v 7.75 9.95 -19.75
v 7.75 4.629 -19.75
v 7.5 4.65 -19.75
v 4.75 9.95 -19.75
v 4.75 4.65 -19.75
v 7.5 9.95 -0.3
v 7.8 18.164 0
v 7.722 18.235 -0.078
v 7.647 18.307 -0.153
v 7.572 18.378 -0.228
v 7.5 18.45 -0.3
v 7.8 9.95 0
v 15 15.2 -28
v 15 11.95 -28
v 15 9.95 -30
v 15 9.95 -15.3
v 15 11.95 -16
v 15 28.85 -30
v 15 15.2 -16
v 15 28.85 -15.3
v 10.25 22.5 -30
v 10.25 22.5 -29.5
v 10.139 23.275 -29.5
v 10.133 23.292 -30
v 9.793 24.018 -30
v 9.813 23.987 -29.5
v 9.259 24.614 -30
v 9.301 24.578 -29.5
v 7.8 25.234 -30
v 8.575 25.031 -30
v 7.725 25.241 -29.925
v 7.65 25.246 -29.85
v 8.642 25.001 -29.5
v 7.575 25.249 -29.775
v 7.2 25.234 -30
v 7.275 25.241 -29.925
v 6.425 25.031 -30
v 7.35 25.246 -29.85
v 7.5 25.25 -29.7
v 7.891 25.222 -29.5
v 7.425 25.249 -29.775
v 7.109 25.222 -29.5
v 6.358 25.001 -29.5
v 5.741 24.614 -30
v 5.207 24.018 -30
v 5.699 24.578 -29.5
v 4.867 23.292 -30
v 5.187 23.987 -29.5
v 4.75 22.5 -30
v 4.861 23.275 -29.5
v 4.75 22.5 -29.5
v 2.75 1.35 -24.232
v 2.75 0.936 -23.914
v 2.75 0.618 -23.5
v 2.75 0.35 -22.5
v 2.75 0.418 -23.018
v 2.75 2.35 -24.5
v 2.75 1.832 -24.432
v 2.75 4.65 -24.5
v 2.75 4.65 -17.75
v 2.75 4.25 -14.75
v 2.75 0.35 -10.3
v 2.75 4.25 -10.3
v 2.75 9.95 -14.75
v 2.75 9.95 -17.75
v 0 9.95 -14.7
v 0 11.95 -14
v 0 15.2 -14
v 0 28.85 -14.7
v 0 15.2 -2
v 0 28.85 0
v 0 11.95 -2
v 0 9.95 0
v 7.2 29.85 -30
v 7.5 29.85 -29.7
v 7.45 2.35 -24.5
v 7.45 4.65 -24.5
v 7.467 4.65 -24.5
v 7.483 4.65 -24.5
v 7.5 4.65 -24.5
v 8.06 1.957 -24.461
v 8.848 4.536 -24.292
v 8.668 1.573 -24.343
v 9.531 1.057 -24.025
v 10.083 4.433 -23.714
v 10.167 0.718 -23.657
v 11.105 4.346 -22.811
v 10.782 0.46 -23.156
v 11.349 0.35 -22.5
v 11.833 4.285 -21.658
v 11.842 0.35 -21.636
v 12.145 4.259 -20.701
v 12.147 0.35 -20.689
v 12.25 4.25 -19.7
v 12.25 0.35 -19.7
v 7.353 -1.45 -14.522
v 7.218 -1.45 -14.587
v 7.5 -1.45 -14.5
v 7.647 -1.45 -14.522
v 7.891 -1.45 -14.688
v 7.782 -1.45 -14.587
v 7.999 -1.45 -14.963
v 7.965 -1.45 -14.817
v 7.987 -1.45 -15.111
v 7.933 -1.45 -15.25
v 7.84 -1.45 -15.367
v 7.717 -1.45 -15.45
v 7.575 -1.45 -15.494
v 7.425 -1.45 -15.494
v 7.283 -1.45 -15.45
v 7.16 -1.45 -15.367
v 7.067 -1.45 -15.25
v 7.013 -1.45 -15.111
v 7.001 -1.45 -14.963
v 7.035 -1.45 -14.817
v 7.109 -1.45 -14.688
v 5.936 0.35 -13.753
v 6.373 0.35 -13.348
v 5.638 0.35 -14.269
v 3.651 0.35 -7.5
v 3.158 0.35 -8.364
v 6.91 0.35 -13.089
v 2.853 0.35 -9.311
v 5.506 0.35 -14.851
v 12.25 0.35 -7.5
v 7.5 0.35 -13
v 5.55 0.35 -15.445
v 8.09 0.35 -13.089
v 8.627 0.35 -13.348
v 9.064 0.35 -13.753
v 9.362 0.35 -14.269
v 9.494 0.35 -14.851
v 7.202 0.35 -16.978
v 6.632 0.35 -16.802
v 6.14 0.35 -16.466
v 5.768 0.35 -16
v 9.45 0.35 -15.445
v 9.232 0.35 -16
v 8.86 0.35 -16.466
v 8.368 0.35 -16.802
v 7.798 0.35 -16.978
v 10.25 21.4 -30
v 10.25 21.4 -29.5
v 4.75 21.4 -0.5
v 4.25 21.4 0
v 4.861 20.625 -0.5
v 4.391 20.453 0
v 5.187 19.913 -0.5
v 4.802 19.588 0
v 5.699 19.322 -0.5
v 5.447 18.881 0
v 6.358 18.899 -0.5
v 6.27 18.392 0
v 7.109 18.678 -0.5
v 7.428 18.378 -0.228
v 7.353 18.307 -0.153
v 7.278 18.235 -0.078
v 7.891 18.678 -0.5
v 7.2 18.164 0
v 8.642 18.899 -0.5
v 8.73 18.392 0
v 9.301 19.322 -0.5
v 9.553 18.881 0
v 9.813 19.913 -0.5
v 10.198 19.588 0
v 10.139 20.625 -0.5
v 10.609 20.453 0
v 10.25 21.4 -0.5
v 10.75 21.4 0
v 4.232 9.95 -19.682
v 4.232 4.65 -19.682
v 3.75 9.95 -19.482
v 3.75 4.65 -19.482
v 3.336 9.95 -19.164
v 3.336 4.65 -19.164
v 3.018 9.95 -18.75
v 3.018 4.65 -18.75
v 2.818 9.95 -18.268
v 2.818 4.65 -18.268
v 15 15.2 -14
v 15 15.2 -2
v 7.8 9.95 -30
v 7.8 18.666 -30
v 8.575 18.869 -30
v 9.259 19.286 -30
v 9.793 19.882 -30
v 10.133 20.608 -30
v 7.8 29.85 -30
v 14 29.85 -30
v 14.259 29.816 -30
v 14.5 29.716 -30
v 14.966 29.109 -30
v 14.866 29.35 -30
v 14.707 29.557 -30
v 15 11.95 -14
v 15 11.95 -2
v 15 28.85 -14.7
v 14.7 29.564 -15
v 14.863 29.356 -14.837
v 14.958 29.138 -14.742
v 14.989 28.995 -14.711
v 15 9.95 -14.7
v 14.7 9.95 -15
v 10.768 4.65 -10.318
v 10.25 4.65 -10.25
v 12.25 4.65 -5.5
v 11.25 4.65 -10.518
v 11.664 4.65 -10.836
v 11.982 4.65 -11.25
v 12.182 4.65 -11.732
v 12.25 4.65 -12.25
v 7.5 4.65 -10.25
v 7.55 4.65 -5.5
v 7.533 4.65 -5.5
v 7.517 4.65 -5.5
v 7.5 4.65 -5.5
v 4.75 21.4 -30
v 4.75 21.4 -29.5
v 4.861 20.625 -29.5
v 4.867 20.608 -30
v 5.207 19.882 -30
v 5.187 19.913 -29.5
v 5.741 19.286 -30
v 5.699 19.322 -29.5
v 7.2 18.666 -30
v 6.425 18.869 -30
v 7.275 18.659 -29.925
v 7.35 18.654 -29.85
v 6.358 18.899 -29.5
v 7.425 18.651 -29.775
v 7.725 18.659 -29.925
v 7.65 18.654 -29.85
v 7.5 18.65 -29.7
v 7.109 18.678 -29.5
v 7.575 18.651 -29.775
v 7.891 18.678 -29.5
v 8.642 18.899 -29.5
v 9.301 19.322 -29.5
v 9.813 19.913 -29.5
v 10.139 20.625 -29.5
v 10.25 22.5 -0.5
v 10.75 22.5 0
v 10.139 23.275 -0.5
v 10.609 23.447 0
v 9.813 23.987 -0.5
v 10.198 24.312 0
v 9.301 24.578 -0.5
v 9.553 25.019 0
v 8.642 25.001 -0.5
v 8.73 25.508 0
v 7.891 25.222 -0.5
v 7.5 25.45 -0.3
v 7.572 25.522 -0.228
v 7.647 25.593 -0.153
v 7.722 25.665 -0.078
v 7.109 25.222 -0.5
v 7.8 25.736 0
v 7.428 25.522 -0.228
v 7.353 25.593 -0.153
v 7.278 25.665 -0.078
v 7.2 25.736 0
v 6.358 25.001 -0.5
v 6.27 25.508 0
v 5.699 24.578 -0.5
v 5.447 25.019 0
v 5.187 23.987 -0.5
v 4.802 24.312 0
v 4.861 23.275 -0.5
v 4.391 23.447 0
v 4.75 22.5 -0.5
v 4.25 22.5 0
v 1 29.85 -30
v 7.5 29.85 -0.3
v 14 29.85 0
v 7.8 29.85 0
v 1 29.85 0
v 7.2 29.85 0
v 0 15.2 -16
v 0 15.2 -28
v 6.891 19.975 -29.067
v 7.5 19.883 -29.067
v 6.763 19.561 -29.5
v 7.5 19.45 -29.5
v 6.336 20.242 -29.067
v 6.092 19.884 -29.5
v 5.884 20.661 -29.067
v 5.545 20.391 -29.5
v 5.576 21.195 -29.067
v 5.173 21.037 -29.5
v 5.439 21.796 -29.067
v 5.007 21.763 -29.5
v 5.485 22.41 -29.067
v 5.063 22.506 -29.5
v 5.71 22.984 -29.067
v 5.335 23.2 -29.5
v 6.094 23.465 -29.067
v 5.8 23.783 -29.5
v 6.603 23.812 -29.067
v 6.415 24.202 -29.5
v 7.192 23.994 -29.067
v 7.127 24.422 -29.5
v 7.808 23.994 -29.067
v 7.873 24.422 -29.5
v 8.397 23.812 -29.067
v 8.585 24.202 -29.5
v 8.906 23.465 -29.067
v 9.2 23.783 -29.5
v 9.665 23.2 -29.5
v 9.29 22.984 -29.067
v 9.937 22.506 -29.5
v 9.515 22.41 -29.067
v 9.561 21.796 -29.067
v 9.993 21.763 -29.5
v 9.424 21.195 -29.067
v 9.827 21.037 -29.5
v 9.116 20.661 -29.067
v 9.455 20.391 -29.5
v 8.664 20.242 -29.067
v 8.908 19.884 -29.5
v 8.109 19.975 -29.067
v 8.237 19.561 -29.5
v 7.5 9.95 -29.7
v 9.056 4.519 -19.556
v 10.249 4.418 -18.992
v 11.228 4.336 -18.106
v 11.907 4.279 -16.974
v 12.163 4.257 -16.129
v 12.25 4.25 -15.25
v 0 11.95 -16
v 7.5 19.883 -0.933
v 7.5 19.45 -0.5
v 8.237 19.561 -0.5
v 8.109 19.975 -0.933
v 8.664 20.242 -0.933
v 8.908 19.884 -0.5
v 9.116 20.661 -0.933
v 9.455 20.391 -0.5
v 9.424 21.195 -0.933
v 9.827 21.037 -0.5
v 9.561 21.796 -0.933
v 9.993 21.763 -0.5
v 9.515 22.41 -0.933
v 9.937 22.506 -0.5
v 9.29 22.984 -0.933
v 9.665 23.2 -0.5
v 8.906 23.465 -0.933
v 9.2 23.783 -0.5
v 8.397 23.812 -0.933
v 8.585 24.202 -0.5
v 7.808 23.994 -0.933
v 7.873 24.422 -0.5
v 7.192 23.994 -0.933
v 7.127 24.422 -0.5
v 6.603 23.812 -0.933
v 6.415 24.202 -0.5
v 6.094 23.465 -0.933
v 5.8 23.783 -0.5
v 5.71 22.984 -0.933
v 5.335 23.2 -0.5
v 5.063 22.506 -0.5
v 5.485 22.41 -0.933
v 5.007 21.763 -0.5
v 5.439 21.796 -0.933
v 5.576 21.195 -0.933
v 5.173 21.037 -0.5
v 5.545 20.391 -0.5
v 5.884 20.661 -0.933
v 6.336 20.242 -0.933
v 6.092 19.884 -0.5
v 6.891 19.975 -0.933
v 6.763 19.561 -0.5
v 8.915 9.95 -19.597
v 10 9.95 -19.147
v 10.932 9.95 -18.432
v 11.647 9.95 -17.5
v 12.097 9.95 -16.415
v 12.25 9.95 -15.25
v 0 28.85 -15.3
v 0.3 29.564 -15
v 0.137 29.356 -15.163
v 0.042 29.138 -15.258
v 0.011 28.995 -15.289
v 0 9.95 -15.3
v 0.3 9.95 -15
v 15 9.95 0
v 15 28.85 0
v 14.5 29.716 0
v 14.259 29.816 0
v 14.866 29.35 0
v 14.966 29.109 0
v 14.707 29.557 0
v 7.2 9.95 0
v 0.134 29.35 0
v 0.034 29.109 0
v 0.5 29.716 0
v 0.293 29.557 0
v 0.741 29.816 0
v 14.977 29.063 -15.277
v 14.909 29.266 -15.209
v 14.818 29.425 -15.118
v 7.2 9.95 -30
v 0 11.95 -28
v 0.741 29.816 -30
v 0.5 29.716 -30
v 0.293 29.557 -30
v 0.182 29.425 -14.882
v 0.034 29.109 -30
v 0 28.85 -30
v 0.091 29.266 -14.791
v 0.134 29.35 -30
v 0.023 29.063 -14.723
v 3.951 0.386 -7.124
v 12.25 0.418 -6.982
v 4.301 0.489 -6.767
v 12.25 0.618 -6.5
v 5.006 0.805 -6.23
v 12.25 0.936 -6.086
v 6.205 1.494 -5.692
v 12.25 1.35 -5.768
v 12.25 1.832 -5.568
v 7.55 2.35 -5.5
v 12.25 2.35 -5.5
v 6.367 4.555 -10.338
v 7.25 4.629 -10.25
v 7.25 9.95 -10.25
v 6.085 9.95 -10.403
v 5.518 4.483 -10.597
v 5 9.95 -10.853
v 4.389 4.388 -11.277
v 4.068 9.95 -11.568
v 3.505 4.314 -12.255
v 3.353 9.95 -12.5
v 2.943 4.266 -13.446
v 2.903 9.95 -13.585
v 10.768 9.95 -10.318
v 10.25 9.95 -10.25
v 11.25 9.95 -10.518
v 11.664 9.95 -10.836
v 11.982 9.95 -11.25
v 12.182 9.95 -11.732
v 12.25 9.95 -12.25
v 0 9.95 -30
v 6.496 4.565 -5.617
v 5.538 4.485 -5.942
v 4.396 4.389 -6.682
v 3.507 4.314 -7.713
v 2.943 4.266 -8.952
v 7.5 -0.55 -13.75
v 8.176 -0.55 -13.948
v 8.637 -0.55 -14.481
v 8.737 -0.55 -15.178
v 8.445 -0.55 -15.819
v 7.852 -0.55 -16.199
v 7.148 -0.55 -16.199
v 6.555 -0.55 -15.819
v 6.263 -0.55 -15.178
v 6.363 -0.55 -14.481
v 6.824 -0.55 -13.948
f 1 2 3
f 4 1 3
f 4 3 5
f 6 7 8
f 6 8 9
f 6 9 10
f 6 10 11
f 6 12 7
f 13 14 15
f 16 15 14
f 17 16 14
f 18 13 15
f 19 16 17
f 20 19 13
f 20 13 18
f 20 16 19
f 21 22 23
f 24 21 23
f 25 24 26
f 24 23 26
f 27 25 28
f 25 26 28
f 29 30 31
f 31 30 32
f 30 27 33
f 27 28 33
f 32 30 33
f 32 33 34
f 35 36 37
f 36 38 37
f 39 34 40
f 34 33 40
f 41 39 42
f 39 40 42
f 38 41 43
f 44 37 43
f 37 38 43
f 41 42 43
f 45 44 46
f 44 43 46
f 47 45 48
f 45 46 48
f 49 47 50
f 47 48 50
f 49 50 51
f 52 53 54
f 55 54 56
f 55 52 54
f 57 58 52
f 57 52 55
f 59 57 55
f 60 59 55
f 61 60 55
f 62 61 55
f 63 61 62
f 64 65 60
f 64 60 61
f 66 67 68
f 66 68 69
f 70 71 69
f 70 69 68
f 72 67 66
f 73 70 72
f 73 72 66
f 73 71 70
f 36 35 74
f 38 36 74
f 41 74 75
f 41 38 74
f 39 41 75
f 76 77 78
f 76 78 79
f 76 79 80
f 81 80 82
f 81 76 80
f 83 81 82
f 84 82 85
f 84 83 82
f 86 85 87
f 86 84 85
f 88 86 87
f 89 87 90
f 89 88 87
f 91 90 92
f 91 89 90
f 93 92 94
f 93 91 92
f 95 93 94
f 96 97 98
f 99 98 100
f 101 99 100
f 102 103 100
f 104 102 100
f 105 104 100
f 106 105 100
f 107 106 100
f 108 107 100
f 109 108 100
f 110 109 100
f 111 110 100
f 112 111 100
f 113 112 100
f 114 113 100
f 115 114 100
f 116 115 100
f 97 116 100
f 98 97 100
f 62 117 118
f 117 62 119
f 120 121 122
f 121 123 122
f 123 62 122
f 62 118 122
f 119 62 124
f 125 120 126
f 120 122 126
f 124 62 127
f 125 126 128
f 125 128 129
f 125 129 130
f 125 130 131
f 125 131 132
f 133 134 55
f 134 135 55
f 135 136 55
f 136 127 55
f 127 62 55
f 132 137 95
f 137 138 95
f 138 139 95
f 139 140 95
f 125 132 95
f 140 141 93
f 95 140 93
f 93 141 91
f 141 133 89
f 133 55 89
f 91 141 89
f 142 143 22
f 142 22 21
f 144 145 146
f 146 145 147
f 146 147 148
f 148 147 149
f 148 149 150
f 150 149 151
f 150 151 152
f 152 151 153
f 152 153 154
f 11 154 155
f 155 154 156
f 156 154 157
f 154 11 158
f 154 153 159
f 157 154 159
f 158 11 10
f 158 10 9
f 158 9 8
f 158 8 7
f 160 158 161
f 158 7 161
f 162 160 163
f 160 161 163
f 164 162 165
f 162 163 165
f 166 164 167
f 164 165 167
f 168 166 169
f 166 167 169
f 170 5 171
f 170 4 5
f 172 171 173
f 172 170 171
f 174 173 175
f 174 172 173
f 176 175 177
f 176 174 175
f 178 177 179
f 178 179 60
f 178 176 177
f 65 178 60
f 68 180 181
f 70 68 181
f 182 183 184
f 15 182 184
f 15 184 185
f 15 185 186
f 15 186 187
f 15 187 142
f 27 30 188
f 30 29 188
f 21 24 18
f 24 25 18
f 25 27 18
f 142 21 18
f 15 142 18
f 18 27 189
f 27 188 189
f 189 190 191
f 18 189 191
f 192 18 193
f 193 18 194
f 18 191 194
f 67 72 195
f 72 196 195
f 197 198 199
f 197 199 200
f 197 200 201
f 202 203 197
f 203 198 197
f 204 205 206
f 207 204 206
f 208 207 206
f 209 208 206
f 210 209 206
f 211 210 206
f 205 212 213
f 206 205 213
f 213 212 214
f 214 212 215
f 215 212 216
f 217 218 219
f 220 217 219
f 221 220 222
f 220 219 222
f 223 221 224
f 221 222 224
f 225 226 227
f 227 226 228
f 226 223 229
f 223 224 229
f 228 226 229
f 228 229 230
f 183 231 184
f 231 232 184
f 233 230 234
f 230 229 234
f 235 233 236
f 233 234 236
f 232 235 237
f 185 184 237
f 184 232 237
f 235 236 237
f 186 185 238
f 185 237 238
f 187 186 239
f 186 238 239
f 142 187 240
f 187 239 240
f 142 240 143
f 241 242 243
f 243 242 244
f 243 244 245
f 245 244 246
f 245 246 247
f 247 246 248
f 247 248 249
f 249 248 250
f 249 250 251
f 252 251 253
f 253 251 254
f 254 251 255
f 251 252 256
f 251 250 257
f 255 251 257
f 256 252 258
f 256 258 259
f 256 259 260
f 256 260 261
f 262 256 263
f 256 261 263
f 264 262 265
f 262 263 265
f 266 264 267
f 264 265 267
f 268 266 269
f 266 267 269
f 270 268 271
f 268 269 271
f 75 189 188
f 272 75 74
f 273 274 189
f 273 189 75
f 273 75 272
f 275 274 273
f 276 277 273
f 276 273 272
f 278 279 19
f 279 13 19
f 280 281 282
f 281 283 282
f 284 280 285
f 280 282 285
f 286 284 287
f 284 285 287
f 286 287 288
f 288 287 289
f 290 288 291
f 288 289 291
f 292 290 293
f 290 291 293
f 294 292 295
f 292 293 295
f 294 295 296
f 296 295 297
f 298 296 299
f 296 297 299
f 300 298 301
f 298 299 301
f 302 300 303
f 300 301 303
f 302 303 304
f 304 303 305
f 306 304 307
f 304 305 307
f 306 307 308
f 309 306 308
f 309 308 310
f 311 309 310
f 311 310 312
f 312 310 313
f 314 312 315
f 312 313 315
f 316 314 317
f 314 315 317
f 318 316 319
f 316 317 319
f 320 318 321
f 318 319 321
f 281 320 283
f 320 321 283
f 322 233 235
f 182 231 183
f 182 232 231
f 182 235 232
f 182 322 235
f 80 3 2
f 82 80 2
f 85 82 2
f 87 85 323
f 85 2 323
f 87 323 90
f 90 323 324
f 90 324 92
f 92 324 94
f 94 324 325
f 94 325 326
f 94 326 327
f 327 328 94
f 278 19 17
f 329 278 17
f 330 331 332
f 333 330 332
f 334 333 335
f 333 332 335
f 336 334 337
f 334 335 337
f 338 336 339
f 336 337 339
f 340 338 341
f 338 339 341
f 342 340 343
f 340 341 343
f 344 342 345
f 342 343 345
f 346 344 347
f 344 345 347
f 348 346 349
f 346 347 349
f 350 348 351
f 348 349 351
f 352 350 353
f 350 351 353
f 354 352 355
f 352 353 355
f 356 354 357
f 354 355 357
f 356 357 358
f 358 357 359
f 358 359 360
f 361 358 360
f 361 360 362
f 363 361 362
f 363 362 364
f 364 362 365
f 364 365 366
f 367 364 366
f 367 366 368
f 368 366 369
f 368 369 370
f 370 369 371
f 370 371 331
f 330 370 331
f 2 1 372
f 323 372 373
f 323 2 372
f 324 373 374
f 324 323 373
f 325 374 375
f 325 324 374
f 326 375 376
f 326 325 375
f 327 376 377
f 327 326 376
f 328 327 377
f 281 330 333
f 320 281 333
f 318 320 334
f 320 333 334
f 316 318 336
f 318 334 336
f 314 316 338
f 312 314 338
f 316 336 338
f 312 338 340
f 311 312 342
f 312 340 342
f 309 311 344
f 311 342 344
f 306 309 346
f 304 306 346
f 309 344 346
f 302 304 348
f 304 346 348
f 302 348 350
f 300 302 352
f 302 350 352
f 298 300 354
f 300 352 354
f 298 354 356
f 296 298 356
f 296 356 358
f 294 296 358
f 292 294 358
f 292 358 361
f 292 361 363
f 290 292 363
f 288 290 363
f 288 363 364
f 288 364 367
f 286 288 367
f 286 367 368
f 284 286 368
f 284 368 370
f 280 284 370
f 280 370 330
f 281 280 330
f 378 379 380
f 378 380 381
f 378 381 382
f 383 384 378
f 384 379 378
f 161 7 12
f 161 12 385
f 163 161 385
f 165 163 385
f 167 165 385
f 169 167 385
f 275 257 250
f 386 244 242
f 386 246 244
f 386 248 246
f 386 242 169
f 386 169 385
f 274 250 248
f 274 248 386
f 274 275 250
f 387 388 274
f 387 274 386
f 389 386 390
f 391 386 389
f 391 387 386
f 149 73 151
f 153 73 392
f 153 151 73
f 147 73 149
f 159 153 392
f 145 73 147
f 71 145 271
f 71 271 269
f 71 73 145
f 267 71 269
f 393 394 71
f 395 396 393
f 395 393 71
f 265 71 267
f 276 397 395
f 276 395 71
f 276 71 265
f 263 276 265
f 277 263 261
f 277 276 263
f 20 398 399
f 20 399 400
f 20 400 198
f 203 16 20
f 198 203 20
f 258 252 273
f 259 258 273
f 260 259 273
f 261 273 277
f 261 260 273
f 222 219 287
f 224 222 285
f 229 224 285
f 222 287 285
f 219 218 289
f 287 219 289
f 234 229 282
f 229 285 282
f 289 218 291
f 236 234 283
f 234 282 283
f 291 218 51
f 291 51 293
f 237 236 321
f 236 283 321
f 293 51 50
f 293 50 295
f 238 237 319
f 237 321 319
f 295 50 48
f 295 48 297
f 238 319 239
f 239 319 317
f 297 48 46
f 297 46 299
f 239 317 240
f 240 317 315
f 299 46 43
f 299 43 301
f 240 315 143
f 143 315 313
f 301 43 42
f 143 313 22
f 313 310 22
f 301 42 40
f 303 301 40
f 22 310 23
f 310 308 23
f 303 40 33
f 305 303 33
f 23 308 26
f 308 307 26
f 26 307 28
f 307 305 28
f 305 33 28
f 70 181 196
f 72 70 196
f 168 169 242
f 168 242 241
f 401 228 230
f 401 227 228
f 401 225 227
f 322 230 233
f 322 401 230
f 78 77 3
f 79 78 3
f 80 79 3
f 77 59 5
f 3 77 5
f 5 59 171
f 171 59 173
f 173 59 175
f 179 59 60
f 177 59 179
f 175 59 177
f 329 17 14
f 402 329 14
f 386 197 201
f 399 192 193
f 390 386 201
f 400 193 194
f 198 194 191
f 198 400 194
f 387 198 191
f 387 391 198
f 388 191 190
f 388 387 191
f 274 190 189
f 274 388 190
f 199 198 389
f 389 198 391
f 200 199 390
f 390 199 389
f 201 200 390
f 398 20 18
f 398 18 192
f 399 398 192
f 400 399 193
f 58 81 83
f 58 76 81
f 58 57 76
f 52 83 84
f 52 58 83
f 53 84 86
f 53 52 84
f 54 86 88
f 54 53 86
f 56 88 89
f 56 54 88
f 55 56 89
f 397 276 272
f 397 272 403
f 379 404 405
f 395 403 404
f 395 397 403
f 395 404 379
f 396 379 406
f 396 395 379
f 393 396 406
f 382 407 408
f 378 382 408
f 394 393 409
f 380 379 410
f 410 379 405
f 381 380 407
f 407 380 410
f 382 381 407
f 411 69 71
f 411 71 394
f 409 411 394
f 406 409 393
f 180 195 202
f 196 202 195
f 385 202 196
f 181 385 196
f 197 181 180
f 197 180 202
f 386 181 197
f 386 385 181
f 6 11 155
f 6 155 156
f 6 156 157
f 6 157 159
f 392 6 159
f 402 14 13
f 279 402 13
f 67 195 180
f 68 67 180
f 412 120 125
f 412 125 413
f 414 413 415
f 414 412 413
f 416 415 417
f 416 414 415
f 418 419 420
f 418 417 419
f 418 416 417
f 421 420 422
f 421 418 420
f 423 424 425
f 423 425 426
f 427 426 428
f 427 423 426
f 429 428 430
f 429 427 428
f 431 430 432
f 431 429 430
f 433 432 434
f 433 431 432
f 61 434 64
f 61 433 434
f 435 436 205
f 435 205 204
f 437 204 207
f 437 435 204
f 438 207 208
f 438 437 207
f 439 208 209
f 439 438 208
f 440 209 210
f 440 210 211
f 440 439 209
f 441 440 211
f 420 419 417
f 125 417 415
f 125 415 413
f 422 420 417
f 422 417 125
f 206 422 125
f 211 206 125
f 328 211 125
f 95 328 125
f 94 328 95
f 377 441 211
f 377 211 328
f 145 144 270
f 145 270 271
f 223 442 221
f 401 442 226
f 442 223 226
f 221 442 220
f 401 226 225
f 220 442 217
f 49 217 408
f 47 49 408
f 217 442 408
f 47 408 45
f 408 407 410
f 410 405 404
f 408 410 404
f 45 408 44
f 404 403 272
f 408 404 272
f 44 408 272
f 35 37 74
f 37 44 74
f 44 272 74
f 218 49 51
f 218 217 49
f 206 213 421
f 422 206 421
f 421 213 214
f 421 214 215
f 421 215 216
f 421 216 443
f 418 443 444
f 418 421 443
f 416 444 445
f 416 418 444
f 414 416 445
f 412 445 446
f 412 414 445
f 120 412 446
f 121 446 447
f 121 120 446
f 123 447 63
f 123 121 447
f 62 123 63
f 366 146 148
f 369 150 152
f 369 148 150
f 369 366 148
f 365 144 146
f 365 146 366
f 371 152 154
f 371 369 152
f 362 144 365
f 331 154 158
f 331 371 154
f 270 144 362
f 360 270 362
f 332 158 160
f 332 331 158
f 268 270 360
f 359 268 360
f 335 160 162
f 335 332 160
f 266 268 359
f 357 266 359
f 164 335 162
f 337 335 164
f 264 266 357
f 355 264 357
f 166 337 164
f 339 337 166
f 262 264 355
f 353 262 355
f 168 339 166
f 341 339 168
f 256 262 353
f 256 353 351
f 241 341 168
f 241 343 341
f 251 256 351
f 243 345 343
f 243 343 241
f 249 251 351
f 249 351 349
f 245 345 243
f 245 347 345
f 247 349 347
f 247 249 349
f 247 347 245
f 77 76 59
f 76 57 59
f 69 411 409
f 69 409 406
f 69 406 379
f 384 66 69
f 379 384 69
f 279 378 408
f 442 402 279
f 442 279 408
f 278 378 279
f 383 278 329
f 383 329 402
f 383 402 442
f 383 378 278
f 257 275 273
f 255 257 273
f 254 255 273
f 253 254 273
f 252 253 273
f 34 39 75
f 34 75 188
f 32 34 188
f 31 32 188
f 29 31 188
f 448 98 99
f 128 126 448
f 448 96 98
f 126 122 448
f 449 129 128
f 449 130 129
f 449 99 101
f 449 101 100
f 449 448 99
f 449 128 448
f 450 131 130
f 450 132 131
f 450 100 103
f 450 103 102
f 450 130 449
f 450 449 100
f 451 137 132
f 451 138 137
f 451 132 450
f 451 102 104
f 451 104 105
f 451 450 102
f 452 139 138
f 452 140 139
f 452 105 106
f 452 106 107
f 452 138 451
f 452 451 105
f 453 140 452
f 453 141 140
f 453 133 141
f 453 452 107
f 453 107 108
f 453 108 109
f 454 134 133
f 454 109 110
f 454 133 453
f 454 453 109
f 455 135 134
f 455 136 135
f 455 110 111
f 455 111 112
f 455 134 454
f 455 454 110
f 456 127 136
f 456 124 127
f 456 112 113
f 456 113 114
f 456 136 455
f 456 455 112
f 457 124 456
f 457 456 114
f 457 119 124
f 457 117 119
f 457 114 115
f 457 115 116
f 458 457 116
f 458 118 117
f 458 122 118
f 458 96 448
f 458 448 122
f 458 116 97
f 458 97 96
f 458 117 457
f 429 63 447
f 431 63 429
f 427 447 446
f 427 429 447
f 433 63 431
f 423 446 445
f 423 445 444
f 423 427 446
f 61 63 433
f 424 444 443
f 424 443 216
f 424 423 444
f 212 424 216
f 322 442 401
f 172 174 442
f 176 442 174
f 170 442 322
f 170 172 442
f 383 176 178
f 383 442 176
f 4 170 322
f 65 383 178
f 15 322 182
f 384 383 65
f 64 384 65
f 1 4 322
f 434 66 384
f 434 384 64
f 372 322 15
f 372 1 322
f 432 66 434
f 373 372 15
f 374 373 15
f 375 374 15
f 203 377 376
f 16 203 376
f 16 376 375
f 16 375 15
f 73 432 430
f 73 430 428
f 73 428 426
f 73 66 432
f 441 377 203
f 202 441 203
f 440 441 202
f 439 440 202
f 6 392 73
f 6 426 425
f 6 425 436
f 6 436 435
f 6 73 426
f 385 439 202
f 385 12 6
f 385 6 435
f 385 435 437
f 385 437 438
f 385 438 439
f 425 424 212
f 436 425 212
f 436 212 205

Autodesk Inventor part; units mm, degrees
ref_plane "YZ Plane" through (0, 0, 0) normal (1, 0, 0) x (0, 1, 0)
ref_plane "XZ Plane" through (0, 0, 0) normal (0, 1, 0) x (-1, 0, 0)
ref_plane "XY Plane" through (0, 0, 0) normal (0, 0, 1) x (1, 0, 0)
sketch "Sketch_1" plane through (0, 0, 0) normal (0, 0, 1) x (1, 0, 0)
  line L0 (0, 28.85) -> (0, 9.95)
  line L1 (0, 9.95) -> (15, 9.95)
  line L2 (15, 9.95) -> (15, 28.85)
  arc A0 (15, 28.85) -> (14, 29.85) centre (14, 28.85) ccw
  line L3 (14, 29.85) -> (1, 29.85)
  arc A1 (1, 29.85) -> (0, 28.85) centre (1, 28.85) ccw
extrude "Extrusion1" add sketch "Sketch_1" against normal blind 30
sketch "Sketch_6" plane through (7.5, 0, 0) normal (1, 0, 0) x (0, 0, -1)
  line L0 (0, 21.4) -> (35, 21.4)
  line L1 (35, 21.4) -> (35, 18.15)
  line L2 (35, 18.15) -> (34.5, 18.65)
  line L3 (34.5, 18.65) -> (0.5, 18.65)
  line L4 (0.5, 18.65) -> (0, 18.15)
  line L5 (0, 18.15) -> (0, 21.4)
  line L6 (0, 21.4) -> (35, 21.4)
revolve "Revolution1" cut sketch "Sketch_6" angle 360 about axis through (7.5, 21.4, 0) along (0, 0, 1)
sketch "Sketch_4" plane through (7.5, 0, 0) normal (1, 0, 0) x (0, 0, -1)
  line L0 (0, 22.5) -> (35, 22.5)
  line L1 (35, 22.5) -> (35, 19.25)
  line L2 (35, 19.25) -> (34.5, 19.75)
  line L3 (34.5, 19.75) -> (0.5, 19.75)
  line L4 (0.5, 19.75) -> (0, 19.25)
  line L5 (0, 19.25) -> (0, 22.5)
  line L6 (0, 22.5) -> (35, 22.5)
revolve "Revolution2" cut sketch "Sketch_4" angle 360 about axis through (7.5, 22.5, 0) along (0, 0, 1)
sketch "Sketch_8" plane through (0, 21.95, 0) normal (0, 1, 0) x (1, 0, 0)
  line L0 (4.25, 0) -> (10.75, 0)
  line L1 (10.75, 0) -> (10.25, 0.5)
  line L2 (10.25, 0.5) -> (10.25, 34.5)
  line L3 (10.25, 34.5) -> (10.75, 35)
  line L4 (10.75, 35) -> (4.25, 35)
  line L5 (4.25, 35) -> (4.75, 34.5)
  line L6 (4.75, 34.5) -> (4.75, 0.5)
  line L7 (4.75, 0.5) -> (4.25, 0)
extrude "Extrusion2" cut sketch "Sketch_8" along normal mid plane 1.1
sketch "Sketch_10" plane through (0, 0, -0.5) normal (0, 0, 1) x (1, 0, 0)
  arc A0 (4.75, 21.4) -> (10.25, 21.4) centre (7.5, 21.4) ccw
  line L0 (10.25, 21.4) -> (10.25, 22.5)
  arc A1 (10.25, 22.5) -> (4.75, 22.5) centre (7.5, 22.5) ccw
  line L1 (4.75, 22.5) -> (4.75, 21.4)
extrude "Extrusion3" add sketch "Sketch_10" against normal blind 29
sketch "Sketch_11" plane through (7.5, 0, 0) normal (1, 0, 0) x (0, 0, -1)
  line L0 (0.5, 21.95) -> (29.5, 21.95)
  line L1 (29.5, 21.95) -> (29.5, 19.45)
  line L2 (29.5, 19.45) -> (29.067, 19.883)
  line L3 (29.067, 19.883) -> (0.933, 19.883)
  line L4 (0.933, 19.883) -> (0.5, 19.45)
  line L5 (0.5, 19.45) -> (0.5, 21.95)
  line L6 (0.5, 21.95) -> (29.5, 21.95)
revolve "Revolution3" cut sketch "Sketch_11" angle 360 about axis through (7.5, 21.95, -0.5) along (0, 0, 1)
thread "Thread1" size "M5x0.8" class "6H" standard "ISO Metric profile" full length
sketch "_____2" plane through (0, 9.95, 0) normal (0, 1, 0) x (1, 0, 0)
  line L0 (2.75, 17.75) -> (2.75, 14.75)
  arc A0 (2.75, 14.75) -> (7.25, 10.25) centre (7.25, 14.75) ccw
  line L1 (7.25, 10.25) -> (10.25, 10.25)
  arc A1 (10.25, 10.25) -> (12.25, 12.25) centre (10.25, 12.25) ccw
  line L2 (12.25, 12.25) -> (12.25, 15.25)
  arc A2 (12.25, 15.25) -> (7.75, 19.75) centre (7.75, 15.25) ccw
  line L3 (7.75, 19.75) -> (4.75, 19.75)
  arc A3 (4.75, 19.75) -> (2.75, 17.75) centre (4.75, 17.75) ccw
extrude "Extrusion4" add sketch "_____2" against normal blind 9.6
sketch "_____3" plane through (7.5, 0, 0) normal (1, 0, 0) x (0, 0, -1)
  line L0 (5.5, 4.65) -> (5.5, 2.35)
  arc A0 (5.5, 2.35) -> (7.5, 0.35) centre (7.5, 2.35) ccw
  line L1 (7.5, 0.35) -> (22.5, 0.35)
  arc A1 (22.5, 0.35) -> (24.5, 2.35) centre (22.5, 2.35) ccw
  line L2 (24.5, 2.35) -> (24.5, 4.65)
  line L3 (24.5, 4.65) -> (5.5, 4.65)
extrude "Extrusion5" add sketch "_____3" along normal mid plane 9.5
sketch "_____4" plane through (0, 0, -14.75) normal (0, 0, 1) x (1, 0, 0)
  line L0 (2.75, 4.25) -> (7.5, 4.65)
  line L1 (7.5, 4.65) -> (2.75, 4.65)
  line L2 (2.75, 4.65) -> (2.75, 4.25)
extrude "Extrusion6" cut sketch "_____4" along normal blind 9.5
sketch "_____5" plane through (0, 0, -15.25) normal (0, 0, 1) x (1, 0, 0)
  line L0 (7.5, 4.65) -> (12.25, 4.25)
  line L1 (12.25, 4.25) -> (12.25, 4.65)
  line L2 (12.25, 4.65) -> (7.5, 4.65)
extrude "Extrusion7" cut sketch "_____5" against normal blind 9.5
sketch "_____7" plane through (0, 0.35, 0) normal (0, 1, 0) x (1, 0, 0)
  line L0 (2.75, 17.75) -> (2.75, 14.75)
  arc A0 (2.75, 14.75) -> (7.25, 10.25) centre (7.25, 14.75) ccw
  line L1 (7.25, 10.25) -> (10.25, 10.25)
  arc A1 (10.25, 10.25) -> (12.25, 12.25) centre (10.25, 12.25) ccw
  line L2 (12.25, 12.25) -> (12.25, 15.25)
  arc A2 (12.25, 15.25) -> (7.75, 19.75) centre (7.75, 15.25) ccw
  line L3 (7.75, 19.75) -> (4.75, 19.75)
  arc A3 (4.75, 19.75) -> (2.75, 17.75) centre (4.75, 17.75) ccw
extrude "Extrusion8" add sketch "_____7" along normal blind 4.3
sketch "_____1" plane through (0, 0.35, 0) normal (0, 1, 0) x (1, 0, 0)
  line L0 (-10.5888, -9.9588) -> (25.3573, -9.9588)
  line L1 (25.3573, -9.9588) -> (25.3573, 39.1524)
  line L2 (25.3573, 39.1524) -> (-10.5888, 39.1524)
  line L3 (-10.5888, 39.1524) -> (-10.5888, -9.9588)
  arc A0 (2.75, 10.3) -> (7.55, 5.5) centre (7.55, 10.3) ccw
  line L4 (7.55, 5.5) -> (12.25, 5.5)
  line L5 (12.25, 5.5) -> (12.25, 19.7)
  arc A1 (12.25, 19.7) -> (7.45, 24.5) centre (7.45, 19.7) ccw
  line L6 (7.45, 24.5) -> (2.75, 24.5)
  line L7 (2.75, 24.5) -> (2.75, 10.3)
extrude "Extrusion9" cut sketch "_____1" along normal mid plane 19.2
sketch "Sketch_3" plane through (7.5, 0, 0) normal (1, 0, 0) x (0, 0, -1)
  line L0 (15, 0.35) -> (15, -1.45)
  line L1 (15, -1.45) -> (14.5, -1.45)
  line L2 (14.5, -1.45) -> (13, 0.35)
  line L3 (13, 0.35) -> (15, 0.35)
  line L4 (15, 0.35) -> (15, -1.45)
revolve "Revolution4" add sketch "Sketch_3" angle 360 about axis through (7.5, 0.35, -15) along (0, 1, 0)
sketch "Sketch_7" plane through (15, 0, 0) normal (1, 0, 0) x (0, 0, -1)
  line L0 (2, 15.2) -> (2, 11.95)
  line L1 (2, 11.95) -> (14, 11.95)
  line L2 (14, 11.95) -> (14, 15.2)
  line L3 (14, 15.2) -> (2, 15.2)
extrude "Extrusion10" cut sketch "Sketch_7" against normal blind 15
sketch "Sketch_5" plane through (15, 0, 0) normal (1, 0, 0) x (0, 0, -1)
  line L0 (16, 15.2) -> (16, 11.95)
  line L1 (16, 11.95) -> (28, 11.95)
  line L2 (28, 11.95) -> (28, 15.2)
  line L3 (28, 15.2) -> (16, 15.2)
extrude "Extrusion11" cut sketch "Sketch_5" against normal blind 15
sketch "Sketch_9" plane through (0, 0, 0) normal (0, 1, 0) x (-1, 0, 0)
  line L0 (0, -15.3) -> (0, -14.7)
  line L1 (0, -14.7) -> (-0.3, -15)
  line L2 (-0.3, -15) -> (0, -15.3)
extrude "Extrusion12" cut sketch "Sketch_9" along normal blind 40
sketch "Sketch_15" plane through (0, 0, 0) normal (0, 1, 0) x (-1, 0, 0)
  line L0 (-14.7, -15) -> (-15, -14.7)
  line L1 (-15, -14.7) -> (-15, -15.3)
  line L2 (-15, -15.3) -> (-14.7, -15)
extrude "Extrusion13" cut sketch "Sketch_15" along normal blind 40
sketch "Sketch_16" plane through (0, 0, 0) normal (0, 1, 0) x (-1, 0, 0)
  line L0 (-7.2, 0) -> (-7.8, 0)
  line L1 (-7.8, 0) -> (-7.5, -0.3)
  line L2 (-7.5, -0.3) -> (-7.2, 0)
extrude "Extrusion14" cut sketch "Sketch_16" along normal blind 40
sketch "Sketch_17" plane through (0, 0, 0) normal (0, 1, 0) x (-1, 0, 0)
  line L0 (-7.2, -30) -> (-7.5, -29.7)
  line L1 (-7.5, -29.7) -> (-7.8, -30)
  line L2 (-7.8, -30) -> (-7.2, -30)
extrude "Extrusion15" cut sketch "Sketch_17" along normal blind 50
properties part number "HCBRB8"
